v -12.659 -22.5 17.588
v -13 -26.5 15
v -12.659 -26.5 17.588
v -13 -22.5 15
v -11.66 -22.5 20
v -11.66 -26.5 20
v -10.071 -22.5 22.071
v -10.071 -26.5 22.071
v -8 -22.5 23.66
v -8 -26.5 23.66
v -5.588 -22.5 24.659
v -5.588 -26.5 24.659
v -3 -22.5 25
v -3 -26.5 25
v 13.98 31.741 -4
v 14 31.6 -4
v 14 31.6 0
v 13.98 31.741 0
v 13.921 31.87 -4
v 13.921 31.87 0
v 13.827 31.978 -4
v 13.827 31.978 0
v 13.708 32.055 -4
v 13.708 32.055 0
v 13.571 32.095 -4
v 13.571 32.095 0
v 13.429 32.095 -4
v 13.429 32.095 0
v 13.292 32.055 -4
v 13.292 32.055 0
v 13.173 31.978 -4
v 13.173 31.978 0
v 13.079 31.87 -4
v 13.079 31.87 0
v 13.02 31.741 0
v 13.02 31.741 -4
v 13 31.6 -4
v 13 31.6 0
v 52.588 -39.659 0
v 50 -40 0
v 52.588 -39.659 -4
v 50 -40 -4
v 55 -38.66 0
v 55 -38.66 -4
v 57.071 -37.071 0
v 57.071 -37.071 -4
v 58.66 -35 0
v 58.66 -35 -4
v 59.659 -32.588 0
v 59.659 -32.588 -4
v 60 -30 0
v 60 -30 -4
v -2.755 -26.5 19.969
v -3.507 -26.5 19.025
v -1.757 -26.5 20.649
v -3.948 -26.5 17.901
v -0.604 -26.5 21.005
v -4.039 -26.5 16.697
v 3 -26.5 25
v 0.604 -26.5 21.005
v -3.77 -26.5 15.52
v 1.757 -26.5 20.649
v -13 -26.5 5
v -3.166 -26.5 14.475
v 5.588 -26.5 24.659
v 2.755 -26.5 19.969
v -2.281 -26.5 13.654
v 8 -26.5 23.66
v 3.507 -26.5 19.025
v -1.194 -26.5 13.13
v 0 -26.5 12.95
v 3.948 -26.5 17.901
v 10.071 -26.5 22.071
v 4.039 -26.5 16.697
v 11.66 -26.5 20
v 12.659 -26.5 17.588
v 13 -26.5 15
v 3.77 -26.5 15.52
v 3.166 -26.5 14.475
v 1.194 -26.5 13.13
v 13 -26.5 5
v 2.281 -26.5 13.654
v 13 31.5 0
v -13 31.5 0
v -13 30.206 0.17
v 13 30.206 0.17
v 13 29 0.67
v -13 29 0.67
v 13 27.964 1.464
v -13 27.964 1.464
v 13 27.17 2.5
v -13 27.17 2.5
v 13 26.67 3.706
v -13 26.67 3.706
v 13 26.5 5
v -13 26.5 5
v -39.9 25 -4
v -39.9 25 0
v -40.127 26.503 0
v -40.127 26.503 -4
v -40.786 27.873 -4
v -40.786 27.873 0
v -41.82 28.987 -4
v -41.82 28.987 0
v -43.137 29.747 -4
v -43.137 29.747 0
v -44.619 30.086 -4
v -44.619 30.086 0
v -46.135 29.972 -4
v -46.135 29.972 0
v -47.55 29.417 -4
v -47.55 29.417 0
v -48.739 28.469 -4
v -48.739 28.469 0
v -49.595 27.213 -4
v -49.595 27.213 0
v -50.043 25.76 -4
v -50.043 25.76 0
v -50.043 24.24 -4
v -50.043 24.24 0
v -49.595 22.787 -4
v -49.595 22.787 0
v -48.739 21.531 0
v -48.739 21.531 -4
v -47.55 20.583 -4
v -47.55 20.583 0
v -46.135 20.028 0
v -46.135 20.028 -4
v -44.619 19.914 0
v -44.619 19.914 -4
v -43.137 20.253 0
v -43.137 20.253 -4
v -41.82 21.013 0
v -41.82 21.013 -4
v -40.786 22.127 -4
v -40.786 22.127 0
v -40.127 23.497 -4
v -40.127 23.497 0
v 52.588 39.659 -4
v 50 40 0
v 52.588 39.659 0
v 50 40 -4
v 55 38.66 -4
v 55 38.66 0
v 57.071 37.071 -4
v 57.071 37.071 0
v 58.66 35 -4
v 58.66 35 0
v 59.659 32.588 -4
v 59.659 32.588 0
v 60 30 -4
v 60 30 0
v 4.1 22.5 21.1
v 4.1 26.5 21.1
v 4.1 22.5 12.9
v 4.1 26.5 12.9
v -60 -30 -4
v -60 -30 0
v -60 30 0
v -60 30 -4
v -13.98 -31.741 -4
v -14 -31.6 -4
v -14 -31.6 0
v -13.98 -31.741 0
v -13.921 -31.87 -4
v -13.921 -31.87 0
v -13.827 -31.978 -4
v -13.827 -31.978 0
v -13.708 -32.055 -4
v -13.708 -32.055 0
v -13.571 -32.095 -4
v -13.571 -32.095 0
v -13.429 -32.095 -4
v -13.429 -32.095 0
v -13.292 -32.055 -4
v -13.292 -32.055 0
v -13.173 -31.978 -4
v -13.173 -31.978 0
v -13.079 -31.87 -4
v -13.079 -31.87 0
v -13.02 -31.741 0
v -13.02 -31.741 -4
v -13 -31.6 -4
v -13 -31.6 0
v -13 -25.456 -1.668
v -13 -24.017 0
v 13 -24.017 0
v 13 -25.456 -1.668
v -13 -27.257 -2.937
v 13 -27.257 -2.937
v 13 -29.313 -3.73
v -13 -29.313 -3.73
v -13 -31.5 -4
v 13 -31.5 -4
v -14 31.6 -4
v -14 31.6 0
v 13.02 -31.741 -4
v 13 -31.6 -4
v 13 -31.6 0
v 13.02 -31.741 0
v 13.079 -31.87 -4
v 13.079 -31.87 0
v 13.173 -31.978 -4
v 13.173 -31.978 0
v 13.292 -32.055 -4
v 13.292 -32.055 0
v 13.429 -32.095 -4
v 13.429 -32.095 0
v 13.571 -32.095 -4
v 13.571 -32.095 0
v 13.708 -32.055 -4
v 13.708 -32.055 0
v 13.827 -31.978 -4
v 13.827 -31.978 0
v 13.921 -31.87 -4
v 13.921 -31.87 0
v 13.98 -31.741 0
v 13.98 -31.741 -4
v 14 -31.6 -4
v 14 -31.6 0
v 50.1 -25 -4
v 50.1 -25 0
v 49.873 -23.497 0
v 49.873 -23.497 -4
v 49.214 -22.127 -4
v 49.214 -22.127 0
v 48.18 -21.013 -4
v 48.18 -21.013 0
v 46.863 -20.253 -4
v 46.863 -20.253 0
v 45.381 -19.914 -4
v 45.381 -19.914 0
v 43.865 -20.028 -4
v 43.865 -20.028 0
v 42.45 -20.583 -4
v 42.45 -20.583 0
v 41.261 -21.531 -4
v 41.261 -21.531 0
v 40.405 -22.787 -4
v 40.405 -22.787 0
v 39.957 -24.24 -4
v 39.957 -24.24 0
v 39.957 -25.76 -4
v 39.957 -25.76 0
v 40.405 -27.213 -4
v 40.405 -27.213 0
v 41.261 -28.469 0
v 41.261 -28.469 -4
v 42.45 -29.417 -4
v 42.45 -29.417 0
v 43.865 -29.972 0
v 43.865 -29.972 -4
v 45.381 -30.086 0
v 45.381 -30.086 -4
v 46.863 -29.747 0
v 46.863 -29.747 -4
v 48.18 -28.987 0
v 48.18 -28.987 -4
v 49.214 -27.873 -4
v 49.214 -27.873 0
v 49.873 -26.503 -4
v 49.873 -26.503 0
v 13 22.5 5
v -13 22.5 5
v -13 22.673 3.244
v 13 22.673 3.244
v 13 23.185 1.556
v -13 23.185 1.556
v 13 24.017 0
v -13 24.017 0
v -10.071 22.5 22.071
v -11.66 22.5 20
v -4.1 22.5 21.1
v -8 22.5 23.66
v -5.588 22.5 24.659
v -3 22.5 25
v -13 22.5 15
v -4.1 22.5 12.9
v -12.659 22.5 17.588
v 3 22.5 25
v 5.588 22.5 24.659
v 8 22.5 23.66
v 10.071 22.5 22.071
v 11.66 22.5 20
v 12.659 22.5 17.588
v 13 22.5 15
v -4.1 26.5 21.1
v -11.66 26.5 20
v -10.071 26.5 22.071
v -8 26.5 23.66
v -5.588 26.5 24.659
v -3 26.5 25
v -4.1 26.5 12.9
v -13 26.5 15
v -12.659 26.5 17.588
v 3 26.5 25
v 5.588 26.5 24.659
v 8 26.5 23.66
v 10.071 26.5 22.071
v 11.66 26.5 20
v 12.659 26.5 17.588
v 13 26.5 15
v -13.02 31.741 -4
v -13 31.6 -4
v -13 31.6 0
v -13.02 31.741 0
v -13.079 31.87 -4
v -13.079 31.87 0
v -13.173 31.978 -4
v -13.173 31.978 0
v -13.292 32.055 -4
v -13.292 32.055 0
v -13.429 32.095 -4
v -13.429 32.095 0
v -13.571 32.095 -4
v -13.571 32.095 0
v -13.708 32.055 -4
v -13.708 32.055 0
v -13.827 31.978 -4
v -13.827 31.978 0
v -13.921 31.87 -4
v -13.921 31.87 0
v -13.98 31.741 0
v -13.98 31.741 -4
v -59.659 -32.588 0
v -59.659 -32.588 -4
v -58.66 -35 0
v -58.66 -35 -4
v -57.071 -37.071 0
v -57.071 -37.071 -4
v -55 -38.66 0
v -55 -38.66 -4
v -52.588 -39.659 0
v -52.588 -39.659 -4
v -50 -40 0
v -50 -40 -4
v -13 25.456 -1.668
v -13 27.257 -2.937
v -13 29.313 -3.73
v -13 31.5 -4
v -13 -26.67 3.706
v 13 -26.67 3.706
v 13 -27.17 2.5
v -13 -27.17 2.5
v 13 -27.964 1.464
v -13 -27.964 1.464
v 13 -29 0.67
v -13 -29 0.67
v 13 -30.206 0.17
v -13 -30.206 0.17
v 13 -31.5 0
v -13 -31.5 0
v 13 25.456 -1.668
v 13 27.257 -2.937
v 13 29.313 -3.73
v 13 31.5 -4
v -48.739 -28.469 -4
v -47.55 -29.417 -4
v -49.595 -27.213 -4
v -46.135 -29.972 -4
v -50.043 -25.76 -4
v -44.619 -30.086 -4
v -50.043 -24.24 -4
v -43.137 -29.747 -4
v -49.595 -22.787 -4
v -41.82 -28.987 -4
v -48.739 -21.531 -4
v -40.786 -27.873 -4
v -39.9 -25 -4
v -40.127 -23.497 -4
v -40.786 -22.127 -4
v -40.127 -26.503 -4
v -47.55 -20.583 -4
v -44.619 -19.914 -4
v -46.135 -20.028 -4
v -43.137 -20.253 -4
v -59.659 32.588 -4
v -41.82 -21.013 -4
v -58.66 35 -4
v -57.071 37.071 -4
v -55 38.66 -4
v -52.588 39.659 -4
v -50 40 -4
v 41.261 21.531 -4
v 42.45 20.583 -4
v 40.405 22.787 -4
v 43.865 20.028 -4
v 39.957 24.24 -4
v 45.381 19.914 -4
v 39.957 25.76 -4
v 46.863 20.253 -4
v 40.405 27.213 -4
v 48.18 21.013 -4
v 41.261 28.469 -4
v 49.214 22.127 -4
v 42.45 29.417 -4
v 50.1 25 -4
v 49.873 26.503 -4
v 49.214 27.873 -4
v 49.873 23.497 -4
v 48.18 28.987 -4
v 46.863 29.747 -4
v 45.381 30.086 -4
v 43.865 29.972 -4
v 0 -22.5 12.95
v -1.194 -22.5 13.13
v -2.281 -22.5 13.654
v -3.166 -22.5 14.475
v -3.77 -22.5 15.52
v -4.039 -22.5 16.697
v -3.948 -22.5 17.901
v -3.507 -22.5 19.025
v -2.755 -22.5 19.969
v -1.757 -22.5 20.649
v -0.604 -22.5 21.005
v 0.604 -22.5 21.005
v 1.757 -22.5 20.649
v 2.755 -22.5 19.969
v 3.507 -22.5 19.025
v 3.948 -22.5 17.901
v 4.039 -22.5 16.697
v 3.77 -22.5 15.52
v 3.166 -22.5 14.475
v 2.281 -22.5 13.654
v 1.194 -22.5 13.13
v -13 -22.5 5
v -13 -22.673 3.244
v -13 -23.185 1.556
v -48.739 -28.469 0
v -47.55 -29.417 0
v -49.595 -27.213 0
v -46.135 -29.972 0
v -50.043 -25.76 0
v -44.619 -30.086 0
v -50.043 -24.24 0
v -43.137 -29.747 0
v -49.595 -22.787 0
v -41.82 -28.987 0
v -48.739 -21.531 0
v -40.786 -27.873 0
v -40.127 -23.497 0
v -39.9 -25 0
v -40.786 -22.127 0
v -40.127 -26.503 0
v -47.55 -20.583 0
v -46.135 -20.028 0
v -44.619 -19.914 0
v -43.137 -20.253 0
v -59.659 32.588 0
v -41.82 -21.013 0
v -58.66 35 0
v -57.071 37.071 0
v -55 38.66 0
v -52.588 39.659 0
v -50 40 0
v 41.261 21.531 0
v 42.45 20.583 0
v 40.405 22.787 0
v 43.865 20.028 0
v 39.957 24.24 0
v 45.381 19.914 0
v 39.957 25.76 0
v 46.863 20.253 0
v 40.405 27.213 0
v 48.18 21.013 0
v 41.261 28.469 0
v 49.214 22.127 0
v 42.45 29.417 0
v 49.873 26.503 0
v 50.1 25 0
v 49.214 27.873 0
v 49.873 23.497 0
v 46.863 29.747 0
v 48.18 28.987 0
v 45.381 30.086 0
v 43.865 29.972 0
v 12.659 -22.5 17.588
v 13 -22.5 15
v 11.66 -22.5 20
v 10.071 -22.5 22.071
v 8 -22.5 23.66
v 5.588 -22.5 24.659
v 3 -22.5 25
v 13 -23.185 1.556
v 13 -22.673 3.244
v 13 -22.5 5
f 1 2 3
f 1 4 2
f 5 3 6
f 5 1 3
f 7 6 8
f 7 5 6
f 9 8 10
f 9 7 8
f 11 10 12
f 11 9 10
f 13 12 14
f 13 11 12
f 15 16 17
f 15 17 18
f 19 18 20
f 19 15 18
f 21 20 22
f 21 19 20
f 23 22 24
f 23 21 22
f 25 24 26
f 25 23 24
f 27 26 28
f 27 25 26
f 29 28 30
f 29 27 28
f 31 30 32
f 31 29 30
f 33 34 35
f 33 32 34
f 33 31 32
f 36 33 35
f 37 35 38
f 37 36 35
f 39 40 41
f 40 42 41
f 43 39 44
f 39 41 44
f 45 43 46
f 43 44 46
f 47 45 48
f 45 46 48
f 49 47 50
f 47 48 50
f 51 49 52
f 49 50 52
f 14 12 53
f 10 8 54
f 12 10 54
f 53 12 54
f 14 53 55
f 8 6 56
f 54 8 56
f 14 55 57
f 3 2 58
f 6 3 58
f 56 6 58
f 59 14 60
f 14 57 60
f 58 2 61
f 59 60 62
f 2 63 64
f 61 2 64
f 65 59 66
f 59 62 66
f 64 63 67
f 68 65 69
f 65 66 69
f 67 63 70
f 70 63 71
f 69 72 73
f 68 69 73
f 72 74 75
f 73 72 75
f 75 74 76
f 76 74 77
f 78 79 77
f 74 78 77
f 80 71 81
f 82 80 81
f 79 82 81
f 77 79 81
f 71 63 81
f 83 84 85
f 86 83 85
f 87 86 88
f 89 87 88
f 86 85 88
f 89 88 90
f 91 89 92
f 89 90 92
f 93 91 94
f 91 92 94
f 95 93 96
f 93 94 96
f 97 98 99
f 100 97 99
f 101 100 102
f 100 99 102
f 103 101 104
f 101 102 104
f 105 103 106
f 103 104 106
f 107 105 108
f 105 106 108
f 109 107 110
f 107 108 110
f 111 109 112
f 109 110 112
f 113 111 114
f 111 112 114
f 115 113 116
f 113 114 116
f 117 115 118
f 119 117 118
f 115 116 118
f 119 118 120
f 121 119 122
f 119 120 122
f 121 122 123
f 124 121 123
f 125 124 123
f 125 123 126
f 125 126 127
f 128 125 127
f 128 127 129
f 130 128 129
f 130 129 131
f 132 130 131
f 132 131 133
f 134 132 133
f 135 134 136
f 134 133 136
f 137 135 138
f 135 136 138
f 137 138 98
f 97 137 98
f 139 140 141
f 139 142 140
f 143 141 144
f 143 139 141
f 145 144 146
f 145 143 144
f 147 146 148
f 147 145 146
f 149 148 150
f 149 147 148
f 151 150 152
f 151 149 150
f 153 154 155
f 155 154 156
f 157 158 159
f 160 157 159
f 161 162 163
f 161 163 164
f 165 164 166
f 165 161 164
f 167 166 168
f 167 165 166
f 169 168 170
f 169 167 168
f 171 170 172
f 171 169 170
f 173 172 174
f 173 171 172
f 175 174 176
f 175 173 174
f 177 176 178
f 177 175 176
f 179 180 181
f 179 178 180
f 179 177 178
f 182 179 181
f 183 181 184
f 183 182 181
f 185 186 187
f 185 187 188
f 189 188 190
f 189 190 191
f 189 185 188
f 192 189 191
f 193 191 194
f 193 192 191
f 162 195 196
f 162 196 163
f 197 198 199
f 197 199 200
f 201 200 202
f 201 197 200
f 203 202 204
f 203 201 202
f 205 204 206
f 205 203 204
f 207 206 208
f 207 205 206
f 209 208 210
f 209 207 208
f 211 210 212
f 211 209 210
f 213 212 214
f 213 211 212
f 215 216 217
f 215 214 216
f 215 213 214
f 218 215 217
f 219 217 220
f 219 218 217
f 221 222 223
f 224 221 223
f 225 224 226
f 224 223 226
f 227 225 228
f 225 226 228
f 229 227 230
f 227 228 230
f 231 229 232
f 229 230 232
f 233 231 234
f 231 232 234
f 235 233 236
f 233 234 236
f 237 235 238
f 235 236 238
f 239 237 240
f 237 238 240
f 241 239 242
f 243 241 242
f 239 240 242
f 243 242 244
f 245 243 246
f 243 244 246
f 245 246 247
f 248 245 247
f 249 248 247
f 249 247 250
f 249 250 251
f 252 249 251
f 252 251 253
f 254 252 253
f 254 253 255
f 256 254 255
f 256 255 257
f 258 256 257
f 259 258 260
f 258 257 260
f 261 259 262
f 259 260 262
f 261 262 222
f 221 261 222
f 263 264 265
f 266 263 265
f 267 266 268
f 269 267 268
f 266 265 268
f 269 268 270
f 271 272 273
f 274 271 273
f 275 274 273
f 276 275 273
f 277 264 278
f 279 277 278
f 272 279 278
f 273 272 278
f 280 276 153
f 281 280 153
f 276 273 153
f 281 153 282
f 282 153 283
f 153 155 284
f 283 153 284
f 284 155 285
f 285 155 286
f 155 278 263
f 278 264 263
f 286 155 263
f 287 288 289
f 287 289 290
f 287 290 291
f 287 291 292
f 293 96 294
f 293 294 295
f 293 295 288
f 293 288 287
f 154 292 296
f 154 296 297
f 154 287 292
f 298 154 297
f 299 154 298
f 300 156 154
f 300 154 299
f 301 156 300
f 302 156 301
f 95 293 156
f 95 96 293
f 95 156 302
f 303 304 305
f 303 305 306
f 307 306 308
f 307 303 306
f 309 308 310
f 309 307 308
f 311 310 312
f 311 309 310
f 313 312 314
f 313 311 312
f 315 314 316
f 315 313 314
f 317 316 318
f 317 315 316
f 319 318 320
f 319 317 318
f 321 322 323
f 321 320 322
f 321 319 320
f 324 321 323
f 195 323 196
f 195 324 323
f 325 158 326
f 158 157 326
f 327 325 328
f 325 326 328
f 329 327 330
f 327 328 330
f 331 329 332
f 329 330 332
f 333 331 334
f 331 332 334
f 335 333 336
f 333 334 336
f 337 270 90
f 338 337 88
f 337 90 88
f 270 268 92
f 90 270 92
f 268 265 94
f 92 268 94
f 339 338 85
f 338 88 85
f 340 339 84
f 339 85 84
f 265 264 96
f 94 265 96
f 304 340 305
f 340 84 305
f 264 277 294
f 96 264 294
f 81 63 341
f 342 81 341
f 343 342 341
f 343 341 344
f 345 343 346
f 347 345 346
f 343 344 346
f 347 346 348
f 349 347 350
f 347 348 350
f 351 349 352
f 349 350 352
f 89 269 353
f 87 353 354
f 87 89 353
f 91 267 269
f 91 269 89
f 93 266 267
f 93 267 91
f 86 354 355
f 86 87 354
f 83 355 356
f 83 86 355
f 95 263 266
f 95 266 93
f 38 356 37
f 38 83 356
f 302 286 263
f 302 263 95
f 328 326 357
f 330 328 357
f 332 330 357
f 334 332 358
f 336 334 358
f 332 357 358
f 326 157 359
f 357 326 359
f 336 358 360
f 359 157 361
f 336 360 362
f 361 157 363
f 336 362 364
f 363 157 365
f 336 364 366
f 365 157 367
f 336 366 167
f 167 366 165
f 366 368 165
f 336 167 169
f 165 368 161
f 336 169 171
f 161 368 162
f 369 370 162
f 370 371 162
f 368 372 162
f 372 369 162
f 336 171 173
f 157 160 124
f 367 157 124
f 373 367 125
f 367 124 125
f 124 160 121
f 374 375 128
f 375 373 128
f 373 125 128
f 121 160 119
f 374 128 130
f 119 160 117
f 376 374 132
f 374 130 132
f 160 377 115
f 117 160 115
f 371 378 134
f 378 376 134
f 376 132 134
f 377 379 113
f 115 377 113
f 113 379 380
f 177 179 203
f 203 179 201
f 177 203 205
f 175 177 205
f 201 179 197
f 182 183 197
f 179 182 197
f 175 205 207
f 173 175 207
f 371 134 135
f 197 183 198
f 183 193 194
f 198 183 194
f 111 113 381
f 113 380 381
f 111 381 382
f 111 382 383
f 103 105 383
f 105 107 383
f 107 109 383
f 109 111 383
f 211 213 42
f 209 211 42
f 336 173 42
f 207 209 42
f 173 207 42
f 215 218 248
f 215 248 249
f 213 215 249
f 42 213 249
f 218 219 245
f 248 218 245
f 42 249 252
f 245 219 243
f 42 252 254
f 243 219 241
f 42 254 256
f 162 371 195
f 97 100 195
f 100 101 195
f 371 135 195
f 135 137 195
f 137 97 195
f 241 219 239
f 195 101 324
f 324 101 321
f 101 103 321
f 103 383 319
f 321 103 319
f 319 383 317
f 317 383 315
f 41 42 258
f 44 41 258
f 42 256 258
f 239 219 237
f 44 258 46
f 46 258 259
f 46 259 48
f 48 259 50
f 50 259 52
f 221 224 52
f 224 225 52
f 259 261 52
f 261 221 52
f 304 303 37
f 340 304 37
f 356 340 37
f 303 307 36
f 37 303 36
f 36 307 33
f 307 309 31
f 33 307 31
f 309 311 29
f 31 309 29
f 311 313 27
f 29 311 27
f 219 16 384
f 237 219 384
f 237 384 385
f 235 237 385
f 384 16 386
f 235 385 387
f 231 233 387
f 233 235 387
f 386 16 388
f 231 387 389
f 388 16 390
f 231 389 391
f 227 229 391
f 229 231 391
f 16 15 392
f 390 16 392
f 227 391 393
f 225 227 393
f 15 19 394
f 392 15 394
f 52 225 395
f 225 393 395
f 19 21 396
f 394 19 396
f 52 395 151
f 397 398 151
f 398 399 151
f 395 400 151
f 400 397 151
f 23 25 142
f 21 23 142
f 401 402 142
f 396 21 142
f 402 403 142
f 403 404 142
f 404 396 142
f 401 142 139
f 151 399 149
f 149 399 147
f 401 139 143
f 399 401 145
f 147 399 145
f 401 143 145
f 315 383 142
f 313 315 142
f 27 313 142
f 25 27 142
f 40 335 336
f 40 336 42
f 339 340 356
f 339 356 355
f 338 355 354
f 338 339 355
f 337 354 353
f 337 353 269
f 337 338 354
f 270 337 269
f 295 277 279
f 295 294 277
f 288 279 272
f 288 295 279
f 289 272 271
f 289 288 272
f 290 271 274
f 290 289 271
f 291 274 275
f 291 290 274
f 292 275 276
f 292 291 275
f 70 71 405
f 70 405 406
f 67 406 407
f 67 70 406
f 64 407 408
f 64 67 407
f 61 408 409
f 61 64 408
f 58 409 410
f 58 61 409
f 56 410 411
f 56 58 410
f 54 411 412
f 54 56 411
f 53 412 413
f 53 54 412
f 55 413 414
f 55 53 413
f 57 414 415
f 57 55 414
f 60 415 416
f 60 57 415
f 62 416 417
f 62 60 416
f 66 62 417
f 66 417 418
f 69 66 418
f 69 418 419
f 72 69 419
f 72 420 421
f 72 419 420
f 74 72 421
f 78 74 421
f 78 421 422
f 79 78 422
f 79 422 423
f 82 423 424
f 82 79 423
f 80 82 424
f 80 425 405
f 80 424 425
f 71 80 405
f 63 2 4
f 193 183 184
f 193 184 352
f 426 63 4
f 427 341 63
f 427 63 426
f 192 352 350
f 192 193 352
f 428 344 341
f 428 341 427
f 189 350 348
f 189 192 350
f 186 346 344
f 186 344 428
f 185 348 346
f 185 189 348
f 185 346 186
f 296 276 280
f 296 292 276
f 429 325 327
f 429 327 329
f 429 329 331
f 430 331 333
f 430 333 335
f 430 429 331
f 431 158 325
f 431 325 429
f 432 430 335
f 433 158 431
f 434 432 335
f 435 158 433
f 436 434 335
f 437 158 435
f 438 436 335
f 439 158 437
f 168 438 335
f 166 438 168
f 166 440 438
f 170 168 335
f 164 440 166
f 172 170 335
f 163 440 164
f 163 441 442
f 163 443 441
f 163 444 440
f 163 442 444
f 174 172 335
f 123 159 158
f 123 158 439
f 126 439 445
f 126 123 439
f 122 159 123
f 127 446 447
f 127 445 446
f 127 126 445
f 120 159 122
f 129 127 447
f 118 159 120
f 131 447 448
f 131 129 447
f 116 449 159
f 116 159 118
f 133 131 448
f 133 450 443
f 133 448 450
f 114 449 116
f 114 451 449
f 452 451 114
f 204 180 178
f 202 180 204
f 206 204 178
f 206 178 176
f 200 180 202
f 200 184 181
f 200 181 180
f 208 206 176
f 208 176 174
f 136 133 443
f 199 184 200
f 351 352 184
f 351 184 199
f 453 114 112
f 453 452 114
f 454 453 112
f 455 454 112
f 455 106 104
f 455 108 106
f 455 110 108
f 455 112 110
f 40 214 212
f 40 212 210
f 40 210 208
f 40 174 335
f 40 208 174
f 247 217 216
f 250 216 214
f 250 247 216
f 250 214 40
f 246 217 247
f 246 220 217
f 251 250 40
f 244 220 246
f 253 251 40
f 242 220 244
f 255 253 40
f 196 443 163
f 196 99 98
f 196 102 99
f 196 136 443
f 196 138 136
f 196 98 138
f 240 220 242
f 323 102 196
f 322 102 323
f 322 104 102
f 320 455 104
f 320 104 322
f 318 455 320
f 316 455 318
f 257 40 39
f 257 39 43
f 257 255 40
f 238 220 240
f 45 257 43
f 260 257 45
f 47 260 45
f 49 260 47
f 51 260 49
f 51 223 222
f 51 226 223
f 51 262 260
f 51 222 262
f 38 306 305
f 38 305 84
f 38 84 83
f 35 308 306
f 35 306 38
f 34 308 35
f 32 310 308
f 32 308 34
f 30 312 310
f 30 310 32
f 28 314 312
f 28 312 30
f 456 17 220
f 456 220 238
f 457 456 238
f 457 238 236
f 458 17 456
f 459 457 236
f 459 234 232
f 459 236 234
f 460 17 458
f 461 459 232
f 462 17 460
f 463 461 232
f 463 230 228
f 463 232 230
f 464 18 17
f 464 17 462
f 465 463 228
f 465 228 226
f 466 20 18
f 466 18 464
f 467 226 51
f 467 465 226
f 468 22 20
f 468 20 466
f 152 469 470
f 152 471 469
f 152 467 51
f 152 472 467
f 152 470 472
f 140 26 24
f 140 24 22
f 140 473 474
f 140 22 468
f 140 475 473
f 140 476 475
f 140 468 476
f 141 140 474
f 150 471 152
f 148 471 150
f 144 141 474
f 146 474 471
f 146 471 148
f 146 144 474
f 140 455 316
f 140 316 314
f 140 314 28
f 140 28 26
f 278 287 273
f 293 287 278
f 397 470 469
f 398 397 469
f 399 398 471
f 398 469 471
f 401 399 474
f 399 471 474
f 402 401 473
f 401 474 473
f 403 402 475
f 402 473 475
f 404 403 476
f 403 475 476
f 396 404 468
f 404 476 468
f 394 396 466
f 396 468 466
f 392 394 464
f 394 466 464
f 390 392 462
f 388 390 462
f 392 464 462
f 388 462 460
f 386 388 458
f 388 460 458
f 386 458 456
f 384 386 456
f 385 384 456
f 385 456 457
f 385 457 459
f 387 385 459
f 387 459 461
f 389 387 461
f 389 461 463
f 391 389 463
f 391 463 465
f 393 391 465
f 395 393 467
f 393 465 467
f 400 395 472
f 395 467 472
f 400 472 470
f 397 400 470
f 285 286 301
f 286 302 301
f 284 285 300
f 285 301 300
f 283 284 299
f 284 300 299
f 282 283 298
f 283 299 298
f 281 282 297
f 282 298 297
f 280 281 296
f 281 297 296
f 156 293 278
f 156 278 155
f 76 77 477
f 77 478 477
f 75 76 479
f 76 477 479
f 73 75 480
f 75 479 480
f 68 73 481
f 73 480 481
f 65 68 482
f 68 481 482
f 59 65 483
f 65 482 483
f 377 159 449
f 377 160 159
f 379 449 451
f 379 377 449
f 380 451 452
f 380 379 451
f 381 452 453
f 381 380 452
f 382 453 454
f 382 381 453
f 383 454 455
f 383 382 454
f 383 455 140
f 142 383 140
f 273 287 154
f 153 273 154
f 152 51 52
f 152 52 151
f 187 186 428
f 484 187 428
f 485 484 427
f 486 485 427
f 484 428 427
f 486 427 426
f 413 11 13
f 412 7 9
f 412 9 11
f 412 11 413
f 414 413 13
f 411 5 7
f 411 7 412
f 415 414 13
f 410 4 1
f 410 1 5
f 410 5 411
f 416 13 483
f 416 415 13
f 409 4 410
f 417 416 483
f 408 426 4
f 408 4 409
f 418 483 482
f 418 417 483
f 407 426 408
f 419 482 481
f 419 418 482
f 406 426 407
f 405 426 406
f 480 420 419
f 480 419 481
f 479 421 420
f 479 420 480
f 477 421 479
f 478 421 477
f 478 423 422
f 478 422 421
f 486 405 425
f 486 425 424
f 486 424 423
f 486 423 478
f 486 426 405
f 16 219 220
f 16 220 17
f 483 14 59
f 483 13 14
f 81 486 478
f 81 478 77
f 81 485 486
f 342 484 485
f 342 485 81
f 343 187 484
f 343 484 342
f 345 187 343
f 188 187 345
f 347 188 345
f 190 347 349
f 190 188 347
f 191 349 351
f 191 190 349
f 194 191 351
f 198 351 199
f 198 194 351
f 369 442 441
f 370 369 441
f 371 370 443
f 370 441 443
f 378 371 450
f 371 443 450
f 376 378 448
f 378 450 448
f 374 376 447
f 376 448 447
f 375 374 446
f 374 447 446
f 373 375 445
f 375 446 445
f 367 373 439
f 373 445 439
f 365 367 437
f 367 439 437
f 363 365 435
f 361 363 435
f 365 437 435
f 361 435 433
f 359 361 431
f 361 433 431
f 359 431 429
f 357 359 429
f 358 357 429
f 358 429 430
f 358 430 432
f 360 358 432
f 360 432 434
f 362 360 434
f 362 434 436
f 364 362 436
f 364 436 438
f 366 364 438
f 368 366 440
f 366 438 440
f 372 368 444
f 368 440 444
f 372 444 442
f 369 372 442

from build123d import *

# Parameters (mm, degrees)
SKETCH_1_W        = 120
SKETCH_1_H        = 80
SKETCH_1_W_2      = 28
SKETCH_1_H_2      = 45
BASE_PLATE_DEPTH  = 4
TABS2_START       = -5
TABS2_DEPTH       = 10
TABS2_2_OUTLINE_W = 26
TABS2_2_OUTLINE_H = 4
TABS2_2_DEPTH     = 1.41096
TABS2_START_2     = 5
TABS2_3_OUTLINE_W = 26
TABS2_3_OUTLINE_H = 4
TABS2_3_DEPTH     = 20
TABS2_START_3     = -13
TABS2_4_DEPTH     = 26
TABS2_5_DEPTH     = 26
HOLES_DEPTH       = 77.321687612
HOLES_DEPTH_BACK  = 77.321687612
SKETCH_10_R       = 4.05
SKETCH_12_W       = 8.2
SKETCH_12_H       = 8.2
HOLE2_DEPTH       = 4
FILLET_2_R        = 10
SKETCH_11_R       = 5.1
MOUNT_HOLES_DEPTH = 4


with BuildPart() as part:
    # Base Plate: sheet metal written as solids
    # Sketch 1 → Base Plate (new body)
    with BuildSketch(Plane.XY):
        Rectangle(SKETCH_1_W, SKETCH_1_H)
        Rectangle(SKETCH_1_W_2, SKETCH_1_H_2, mode=Mode.SUBTRACT)
    extrude(amount=-BASE_PLATE_DEPTH)

    # Tabs2: read off the stored shape, not the designer's step
    # Tabs2 outline → Tabs2 (cut)
    with BuildSketch(Plane.XY.offset(TABS2_START)):
        with BuildLine():
            ThreePointArc((-13, 31.6), (-13.5, 32.1), (-14, 31.6))
            Line((-14, 31.6), (-14, 22.5))
            Line((-14, 22.5), (-13, 22.5))
            Line((-13, 22.5), (-13, 31.6))
        make_face()
        with BuildLine():
            Line((-13, -22.5), (-14, -22.5))
            Line((-14, -22.5), (-14, -31.6))
            ThreePointArc((-14, -31.6), (-13.5, -32.1), (-13, -31.6))
            Line((-13, -31.6), (-13, -22.5))
        make_face()
        with BuildLine():
            Line((13, 31.6), (13, 22.5))
            Line((13, 22.5), (14, 22.5))
            Line((14, 22.5), (14, 31.6))
            ThreePointArc((14, 31.6), (13.5, 32.1), (13, 31.6))
        make_face()
        with BuildLine():
            Line((14, -22.5), (13, -22.5))
            Line((13, -22.5), (13, -31.6))
            ThreePointArc((13, -31.6), (13.5, -32.1), (14, -31.6))
            Line((14, -31.6), (14, -22.5))
        make_face()
    extrude(amount=TABS2_DEPTH, mode=Mode.SUBTRACT)

    # Tabs2 2 outline → Tabs2 2 (cut)
    with BuildSketch(Plane.XY.offset(TABS2_START)):
        with Locations((0, 24.5)):
            Rectangle(TABS2_2_OUTLINE_W, TABS2_2_OUTLINE_H)
        with Locations((0, -24.5)):
            Rectangle(TABS2_2_OUTLINE_W, TABS2_2_OUTLINE_H)
    extrude(amount=TABS2_2_DEPTH, mode=Mode.SUBTRACT)

    # Tabs2 4 outline → Tabs2 4 (cut)
    with BuildSketch(Plane.YZ.offset(TABS2_START_3)):
        with BuildLine():
            ThreePointArc((31.5, -4), (27.257359313, -2.937253933), (24.016685226, 0))
            Line((24.016685226, 0), (22.5, 0))
            Line((22.5, 0), (22.5, -3.58904))
            Line((22.5, -3.58904), (26.5, -3.58904))
            Line((26.5, -3.58904), (26.5, -4))
            Line((26.5, -4), (31.5, -4))
        make_face()
        with BuildLine():
            Line((-22.5, -3.58904), (-22.5, 0))
            Line((-22.5, 0), (-24.016685226, 0))
            ThreePointArc((-24.016685226, 0), (-27.257359313, -2.937253933), (-31.5, -4))
            Line((-31.5, -4), (-26.5, -4))
            Line((-26.5, -4), (-26.5, -3.58904))
            Line((-26.5, -3.58904), (-22.5, -3.58904))
        make_face()
    extrude(amount=TABS2_4_DEPTH, mode=Mode.SUBTRACT)



with BuildPart() as body_2:
    # Tabs2 3 outline → Tabs2 3 (new body)
    with BuildSketch(Plane.XY.offset(TABS2_START_2)):
        with Locations((0, 24.5)):
            Rectangle(TABS2_3_OUTLINE_W, TABS2_3_OUTLINE_H)
        with Locations((0, -24.5)):
            Rectangle(TABS2_3_OUTLINE_W, TABS2_3_OUTLINE_H)
    extrude(amount=TABS2_3_DEPTH)


with BuildPart() as part_1:
    add(part.part)

    add(body_2.part)  # Tabs2 5 merges body 2
    # Tabs2 5 outline → Tabs2 5 (add)
    with BuildSketch(Plane.YZ.offset(TABS2_START_3)):
        with BuildLine():
            Line((26.5, 5), (22.5, 5))
            ThreePointArc((22.5, 5), (22.88751392, 2.38751392), (24.016685226, 0))
            Line((24.016685226, 0), (31.5, 0))
            ThreePointArc((31.5, 0), (27.964466094, 1.464466094), (26.5, 5))
        make_face()
        with BuildLine():
            Line((-31.5, 0), (-24.016685226, 0))
            ThreePointArc((-24.016685226, 0), (-22.88751392, 2.38751392), (-22.5, 5))
            Line((-22.5, 5), (-26.5, 5))
            ThreePointArc((-26.5, 5), (-27.964466094, 1.464466094), (-31.5, 0))
        make_face()
    extrude(amount=TABS2_5_DEPTH)

    # Эскиз10 → Holes (cut, two sides: drawn at the far end of the back side and taken through both)
    with BuildSketch(Plane(origin=(0, 0, 0), x_dir=(1, 0, 0), z_dir=(0, 1, 0)).offset(-HOLES_DEPTH_BACK)):
        with Locations(Location((0, -17, 0), (0, 0, 90))):
            Circle(SKETCH_10_R)
    extrude(amount=HOLES_DEPTH + HOLES_DEPTH_BACK, mode=Mode.SUBTRACT)

    # Эскиз12 → Hole2 (cut)
    with BuildSketch(Plane(origin=(0, 26.5, 0), x_dir=(1, 0, 0), z_dir=(0, 1, 0))):
        with Locations((0, -17)):
            Rectangle(SKETCH_12_W, SKETCH_12_H)
    extrude(amount=-HOLE2_DEPTH, mode=Mode.SUBTRACT)

    # Fillet 2
    fillet_2_edges = [part_1.edges().sort_by_distance(p)[0] for p in [
        (13, -24.5, 25),
        (-13, -24.5, 25),
        (-60, 40, -2),
        (60, 40, -2),
        (60, -40, -2),
        (-60, -40, -2),
        (-13, 24.5, 25),
        (13, 24.5, 25),
    ]]
    fillet(fillet_2_edges, radius=FILLET_2_R)

    # Эскиз11 → Mount Holes (cut)
    with BuildSketch(Plane.XY):
        with Locations((-45, 25)):
            Circle(SKETCH_11_R)
        with Locations((45, 25)):
            Circle(SKETCH_11_R)
        with Locations((-45, -25)):
            Circle(SKETCH_11_R)
        with Locations((45, -25)):
            Circle(SKETCH_11_R)
    extrude(amount=-MOUNT_HOLES_DEPTH, mode=Mode.SUBTRACT)


solid = part_1.part
